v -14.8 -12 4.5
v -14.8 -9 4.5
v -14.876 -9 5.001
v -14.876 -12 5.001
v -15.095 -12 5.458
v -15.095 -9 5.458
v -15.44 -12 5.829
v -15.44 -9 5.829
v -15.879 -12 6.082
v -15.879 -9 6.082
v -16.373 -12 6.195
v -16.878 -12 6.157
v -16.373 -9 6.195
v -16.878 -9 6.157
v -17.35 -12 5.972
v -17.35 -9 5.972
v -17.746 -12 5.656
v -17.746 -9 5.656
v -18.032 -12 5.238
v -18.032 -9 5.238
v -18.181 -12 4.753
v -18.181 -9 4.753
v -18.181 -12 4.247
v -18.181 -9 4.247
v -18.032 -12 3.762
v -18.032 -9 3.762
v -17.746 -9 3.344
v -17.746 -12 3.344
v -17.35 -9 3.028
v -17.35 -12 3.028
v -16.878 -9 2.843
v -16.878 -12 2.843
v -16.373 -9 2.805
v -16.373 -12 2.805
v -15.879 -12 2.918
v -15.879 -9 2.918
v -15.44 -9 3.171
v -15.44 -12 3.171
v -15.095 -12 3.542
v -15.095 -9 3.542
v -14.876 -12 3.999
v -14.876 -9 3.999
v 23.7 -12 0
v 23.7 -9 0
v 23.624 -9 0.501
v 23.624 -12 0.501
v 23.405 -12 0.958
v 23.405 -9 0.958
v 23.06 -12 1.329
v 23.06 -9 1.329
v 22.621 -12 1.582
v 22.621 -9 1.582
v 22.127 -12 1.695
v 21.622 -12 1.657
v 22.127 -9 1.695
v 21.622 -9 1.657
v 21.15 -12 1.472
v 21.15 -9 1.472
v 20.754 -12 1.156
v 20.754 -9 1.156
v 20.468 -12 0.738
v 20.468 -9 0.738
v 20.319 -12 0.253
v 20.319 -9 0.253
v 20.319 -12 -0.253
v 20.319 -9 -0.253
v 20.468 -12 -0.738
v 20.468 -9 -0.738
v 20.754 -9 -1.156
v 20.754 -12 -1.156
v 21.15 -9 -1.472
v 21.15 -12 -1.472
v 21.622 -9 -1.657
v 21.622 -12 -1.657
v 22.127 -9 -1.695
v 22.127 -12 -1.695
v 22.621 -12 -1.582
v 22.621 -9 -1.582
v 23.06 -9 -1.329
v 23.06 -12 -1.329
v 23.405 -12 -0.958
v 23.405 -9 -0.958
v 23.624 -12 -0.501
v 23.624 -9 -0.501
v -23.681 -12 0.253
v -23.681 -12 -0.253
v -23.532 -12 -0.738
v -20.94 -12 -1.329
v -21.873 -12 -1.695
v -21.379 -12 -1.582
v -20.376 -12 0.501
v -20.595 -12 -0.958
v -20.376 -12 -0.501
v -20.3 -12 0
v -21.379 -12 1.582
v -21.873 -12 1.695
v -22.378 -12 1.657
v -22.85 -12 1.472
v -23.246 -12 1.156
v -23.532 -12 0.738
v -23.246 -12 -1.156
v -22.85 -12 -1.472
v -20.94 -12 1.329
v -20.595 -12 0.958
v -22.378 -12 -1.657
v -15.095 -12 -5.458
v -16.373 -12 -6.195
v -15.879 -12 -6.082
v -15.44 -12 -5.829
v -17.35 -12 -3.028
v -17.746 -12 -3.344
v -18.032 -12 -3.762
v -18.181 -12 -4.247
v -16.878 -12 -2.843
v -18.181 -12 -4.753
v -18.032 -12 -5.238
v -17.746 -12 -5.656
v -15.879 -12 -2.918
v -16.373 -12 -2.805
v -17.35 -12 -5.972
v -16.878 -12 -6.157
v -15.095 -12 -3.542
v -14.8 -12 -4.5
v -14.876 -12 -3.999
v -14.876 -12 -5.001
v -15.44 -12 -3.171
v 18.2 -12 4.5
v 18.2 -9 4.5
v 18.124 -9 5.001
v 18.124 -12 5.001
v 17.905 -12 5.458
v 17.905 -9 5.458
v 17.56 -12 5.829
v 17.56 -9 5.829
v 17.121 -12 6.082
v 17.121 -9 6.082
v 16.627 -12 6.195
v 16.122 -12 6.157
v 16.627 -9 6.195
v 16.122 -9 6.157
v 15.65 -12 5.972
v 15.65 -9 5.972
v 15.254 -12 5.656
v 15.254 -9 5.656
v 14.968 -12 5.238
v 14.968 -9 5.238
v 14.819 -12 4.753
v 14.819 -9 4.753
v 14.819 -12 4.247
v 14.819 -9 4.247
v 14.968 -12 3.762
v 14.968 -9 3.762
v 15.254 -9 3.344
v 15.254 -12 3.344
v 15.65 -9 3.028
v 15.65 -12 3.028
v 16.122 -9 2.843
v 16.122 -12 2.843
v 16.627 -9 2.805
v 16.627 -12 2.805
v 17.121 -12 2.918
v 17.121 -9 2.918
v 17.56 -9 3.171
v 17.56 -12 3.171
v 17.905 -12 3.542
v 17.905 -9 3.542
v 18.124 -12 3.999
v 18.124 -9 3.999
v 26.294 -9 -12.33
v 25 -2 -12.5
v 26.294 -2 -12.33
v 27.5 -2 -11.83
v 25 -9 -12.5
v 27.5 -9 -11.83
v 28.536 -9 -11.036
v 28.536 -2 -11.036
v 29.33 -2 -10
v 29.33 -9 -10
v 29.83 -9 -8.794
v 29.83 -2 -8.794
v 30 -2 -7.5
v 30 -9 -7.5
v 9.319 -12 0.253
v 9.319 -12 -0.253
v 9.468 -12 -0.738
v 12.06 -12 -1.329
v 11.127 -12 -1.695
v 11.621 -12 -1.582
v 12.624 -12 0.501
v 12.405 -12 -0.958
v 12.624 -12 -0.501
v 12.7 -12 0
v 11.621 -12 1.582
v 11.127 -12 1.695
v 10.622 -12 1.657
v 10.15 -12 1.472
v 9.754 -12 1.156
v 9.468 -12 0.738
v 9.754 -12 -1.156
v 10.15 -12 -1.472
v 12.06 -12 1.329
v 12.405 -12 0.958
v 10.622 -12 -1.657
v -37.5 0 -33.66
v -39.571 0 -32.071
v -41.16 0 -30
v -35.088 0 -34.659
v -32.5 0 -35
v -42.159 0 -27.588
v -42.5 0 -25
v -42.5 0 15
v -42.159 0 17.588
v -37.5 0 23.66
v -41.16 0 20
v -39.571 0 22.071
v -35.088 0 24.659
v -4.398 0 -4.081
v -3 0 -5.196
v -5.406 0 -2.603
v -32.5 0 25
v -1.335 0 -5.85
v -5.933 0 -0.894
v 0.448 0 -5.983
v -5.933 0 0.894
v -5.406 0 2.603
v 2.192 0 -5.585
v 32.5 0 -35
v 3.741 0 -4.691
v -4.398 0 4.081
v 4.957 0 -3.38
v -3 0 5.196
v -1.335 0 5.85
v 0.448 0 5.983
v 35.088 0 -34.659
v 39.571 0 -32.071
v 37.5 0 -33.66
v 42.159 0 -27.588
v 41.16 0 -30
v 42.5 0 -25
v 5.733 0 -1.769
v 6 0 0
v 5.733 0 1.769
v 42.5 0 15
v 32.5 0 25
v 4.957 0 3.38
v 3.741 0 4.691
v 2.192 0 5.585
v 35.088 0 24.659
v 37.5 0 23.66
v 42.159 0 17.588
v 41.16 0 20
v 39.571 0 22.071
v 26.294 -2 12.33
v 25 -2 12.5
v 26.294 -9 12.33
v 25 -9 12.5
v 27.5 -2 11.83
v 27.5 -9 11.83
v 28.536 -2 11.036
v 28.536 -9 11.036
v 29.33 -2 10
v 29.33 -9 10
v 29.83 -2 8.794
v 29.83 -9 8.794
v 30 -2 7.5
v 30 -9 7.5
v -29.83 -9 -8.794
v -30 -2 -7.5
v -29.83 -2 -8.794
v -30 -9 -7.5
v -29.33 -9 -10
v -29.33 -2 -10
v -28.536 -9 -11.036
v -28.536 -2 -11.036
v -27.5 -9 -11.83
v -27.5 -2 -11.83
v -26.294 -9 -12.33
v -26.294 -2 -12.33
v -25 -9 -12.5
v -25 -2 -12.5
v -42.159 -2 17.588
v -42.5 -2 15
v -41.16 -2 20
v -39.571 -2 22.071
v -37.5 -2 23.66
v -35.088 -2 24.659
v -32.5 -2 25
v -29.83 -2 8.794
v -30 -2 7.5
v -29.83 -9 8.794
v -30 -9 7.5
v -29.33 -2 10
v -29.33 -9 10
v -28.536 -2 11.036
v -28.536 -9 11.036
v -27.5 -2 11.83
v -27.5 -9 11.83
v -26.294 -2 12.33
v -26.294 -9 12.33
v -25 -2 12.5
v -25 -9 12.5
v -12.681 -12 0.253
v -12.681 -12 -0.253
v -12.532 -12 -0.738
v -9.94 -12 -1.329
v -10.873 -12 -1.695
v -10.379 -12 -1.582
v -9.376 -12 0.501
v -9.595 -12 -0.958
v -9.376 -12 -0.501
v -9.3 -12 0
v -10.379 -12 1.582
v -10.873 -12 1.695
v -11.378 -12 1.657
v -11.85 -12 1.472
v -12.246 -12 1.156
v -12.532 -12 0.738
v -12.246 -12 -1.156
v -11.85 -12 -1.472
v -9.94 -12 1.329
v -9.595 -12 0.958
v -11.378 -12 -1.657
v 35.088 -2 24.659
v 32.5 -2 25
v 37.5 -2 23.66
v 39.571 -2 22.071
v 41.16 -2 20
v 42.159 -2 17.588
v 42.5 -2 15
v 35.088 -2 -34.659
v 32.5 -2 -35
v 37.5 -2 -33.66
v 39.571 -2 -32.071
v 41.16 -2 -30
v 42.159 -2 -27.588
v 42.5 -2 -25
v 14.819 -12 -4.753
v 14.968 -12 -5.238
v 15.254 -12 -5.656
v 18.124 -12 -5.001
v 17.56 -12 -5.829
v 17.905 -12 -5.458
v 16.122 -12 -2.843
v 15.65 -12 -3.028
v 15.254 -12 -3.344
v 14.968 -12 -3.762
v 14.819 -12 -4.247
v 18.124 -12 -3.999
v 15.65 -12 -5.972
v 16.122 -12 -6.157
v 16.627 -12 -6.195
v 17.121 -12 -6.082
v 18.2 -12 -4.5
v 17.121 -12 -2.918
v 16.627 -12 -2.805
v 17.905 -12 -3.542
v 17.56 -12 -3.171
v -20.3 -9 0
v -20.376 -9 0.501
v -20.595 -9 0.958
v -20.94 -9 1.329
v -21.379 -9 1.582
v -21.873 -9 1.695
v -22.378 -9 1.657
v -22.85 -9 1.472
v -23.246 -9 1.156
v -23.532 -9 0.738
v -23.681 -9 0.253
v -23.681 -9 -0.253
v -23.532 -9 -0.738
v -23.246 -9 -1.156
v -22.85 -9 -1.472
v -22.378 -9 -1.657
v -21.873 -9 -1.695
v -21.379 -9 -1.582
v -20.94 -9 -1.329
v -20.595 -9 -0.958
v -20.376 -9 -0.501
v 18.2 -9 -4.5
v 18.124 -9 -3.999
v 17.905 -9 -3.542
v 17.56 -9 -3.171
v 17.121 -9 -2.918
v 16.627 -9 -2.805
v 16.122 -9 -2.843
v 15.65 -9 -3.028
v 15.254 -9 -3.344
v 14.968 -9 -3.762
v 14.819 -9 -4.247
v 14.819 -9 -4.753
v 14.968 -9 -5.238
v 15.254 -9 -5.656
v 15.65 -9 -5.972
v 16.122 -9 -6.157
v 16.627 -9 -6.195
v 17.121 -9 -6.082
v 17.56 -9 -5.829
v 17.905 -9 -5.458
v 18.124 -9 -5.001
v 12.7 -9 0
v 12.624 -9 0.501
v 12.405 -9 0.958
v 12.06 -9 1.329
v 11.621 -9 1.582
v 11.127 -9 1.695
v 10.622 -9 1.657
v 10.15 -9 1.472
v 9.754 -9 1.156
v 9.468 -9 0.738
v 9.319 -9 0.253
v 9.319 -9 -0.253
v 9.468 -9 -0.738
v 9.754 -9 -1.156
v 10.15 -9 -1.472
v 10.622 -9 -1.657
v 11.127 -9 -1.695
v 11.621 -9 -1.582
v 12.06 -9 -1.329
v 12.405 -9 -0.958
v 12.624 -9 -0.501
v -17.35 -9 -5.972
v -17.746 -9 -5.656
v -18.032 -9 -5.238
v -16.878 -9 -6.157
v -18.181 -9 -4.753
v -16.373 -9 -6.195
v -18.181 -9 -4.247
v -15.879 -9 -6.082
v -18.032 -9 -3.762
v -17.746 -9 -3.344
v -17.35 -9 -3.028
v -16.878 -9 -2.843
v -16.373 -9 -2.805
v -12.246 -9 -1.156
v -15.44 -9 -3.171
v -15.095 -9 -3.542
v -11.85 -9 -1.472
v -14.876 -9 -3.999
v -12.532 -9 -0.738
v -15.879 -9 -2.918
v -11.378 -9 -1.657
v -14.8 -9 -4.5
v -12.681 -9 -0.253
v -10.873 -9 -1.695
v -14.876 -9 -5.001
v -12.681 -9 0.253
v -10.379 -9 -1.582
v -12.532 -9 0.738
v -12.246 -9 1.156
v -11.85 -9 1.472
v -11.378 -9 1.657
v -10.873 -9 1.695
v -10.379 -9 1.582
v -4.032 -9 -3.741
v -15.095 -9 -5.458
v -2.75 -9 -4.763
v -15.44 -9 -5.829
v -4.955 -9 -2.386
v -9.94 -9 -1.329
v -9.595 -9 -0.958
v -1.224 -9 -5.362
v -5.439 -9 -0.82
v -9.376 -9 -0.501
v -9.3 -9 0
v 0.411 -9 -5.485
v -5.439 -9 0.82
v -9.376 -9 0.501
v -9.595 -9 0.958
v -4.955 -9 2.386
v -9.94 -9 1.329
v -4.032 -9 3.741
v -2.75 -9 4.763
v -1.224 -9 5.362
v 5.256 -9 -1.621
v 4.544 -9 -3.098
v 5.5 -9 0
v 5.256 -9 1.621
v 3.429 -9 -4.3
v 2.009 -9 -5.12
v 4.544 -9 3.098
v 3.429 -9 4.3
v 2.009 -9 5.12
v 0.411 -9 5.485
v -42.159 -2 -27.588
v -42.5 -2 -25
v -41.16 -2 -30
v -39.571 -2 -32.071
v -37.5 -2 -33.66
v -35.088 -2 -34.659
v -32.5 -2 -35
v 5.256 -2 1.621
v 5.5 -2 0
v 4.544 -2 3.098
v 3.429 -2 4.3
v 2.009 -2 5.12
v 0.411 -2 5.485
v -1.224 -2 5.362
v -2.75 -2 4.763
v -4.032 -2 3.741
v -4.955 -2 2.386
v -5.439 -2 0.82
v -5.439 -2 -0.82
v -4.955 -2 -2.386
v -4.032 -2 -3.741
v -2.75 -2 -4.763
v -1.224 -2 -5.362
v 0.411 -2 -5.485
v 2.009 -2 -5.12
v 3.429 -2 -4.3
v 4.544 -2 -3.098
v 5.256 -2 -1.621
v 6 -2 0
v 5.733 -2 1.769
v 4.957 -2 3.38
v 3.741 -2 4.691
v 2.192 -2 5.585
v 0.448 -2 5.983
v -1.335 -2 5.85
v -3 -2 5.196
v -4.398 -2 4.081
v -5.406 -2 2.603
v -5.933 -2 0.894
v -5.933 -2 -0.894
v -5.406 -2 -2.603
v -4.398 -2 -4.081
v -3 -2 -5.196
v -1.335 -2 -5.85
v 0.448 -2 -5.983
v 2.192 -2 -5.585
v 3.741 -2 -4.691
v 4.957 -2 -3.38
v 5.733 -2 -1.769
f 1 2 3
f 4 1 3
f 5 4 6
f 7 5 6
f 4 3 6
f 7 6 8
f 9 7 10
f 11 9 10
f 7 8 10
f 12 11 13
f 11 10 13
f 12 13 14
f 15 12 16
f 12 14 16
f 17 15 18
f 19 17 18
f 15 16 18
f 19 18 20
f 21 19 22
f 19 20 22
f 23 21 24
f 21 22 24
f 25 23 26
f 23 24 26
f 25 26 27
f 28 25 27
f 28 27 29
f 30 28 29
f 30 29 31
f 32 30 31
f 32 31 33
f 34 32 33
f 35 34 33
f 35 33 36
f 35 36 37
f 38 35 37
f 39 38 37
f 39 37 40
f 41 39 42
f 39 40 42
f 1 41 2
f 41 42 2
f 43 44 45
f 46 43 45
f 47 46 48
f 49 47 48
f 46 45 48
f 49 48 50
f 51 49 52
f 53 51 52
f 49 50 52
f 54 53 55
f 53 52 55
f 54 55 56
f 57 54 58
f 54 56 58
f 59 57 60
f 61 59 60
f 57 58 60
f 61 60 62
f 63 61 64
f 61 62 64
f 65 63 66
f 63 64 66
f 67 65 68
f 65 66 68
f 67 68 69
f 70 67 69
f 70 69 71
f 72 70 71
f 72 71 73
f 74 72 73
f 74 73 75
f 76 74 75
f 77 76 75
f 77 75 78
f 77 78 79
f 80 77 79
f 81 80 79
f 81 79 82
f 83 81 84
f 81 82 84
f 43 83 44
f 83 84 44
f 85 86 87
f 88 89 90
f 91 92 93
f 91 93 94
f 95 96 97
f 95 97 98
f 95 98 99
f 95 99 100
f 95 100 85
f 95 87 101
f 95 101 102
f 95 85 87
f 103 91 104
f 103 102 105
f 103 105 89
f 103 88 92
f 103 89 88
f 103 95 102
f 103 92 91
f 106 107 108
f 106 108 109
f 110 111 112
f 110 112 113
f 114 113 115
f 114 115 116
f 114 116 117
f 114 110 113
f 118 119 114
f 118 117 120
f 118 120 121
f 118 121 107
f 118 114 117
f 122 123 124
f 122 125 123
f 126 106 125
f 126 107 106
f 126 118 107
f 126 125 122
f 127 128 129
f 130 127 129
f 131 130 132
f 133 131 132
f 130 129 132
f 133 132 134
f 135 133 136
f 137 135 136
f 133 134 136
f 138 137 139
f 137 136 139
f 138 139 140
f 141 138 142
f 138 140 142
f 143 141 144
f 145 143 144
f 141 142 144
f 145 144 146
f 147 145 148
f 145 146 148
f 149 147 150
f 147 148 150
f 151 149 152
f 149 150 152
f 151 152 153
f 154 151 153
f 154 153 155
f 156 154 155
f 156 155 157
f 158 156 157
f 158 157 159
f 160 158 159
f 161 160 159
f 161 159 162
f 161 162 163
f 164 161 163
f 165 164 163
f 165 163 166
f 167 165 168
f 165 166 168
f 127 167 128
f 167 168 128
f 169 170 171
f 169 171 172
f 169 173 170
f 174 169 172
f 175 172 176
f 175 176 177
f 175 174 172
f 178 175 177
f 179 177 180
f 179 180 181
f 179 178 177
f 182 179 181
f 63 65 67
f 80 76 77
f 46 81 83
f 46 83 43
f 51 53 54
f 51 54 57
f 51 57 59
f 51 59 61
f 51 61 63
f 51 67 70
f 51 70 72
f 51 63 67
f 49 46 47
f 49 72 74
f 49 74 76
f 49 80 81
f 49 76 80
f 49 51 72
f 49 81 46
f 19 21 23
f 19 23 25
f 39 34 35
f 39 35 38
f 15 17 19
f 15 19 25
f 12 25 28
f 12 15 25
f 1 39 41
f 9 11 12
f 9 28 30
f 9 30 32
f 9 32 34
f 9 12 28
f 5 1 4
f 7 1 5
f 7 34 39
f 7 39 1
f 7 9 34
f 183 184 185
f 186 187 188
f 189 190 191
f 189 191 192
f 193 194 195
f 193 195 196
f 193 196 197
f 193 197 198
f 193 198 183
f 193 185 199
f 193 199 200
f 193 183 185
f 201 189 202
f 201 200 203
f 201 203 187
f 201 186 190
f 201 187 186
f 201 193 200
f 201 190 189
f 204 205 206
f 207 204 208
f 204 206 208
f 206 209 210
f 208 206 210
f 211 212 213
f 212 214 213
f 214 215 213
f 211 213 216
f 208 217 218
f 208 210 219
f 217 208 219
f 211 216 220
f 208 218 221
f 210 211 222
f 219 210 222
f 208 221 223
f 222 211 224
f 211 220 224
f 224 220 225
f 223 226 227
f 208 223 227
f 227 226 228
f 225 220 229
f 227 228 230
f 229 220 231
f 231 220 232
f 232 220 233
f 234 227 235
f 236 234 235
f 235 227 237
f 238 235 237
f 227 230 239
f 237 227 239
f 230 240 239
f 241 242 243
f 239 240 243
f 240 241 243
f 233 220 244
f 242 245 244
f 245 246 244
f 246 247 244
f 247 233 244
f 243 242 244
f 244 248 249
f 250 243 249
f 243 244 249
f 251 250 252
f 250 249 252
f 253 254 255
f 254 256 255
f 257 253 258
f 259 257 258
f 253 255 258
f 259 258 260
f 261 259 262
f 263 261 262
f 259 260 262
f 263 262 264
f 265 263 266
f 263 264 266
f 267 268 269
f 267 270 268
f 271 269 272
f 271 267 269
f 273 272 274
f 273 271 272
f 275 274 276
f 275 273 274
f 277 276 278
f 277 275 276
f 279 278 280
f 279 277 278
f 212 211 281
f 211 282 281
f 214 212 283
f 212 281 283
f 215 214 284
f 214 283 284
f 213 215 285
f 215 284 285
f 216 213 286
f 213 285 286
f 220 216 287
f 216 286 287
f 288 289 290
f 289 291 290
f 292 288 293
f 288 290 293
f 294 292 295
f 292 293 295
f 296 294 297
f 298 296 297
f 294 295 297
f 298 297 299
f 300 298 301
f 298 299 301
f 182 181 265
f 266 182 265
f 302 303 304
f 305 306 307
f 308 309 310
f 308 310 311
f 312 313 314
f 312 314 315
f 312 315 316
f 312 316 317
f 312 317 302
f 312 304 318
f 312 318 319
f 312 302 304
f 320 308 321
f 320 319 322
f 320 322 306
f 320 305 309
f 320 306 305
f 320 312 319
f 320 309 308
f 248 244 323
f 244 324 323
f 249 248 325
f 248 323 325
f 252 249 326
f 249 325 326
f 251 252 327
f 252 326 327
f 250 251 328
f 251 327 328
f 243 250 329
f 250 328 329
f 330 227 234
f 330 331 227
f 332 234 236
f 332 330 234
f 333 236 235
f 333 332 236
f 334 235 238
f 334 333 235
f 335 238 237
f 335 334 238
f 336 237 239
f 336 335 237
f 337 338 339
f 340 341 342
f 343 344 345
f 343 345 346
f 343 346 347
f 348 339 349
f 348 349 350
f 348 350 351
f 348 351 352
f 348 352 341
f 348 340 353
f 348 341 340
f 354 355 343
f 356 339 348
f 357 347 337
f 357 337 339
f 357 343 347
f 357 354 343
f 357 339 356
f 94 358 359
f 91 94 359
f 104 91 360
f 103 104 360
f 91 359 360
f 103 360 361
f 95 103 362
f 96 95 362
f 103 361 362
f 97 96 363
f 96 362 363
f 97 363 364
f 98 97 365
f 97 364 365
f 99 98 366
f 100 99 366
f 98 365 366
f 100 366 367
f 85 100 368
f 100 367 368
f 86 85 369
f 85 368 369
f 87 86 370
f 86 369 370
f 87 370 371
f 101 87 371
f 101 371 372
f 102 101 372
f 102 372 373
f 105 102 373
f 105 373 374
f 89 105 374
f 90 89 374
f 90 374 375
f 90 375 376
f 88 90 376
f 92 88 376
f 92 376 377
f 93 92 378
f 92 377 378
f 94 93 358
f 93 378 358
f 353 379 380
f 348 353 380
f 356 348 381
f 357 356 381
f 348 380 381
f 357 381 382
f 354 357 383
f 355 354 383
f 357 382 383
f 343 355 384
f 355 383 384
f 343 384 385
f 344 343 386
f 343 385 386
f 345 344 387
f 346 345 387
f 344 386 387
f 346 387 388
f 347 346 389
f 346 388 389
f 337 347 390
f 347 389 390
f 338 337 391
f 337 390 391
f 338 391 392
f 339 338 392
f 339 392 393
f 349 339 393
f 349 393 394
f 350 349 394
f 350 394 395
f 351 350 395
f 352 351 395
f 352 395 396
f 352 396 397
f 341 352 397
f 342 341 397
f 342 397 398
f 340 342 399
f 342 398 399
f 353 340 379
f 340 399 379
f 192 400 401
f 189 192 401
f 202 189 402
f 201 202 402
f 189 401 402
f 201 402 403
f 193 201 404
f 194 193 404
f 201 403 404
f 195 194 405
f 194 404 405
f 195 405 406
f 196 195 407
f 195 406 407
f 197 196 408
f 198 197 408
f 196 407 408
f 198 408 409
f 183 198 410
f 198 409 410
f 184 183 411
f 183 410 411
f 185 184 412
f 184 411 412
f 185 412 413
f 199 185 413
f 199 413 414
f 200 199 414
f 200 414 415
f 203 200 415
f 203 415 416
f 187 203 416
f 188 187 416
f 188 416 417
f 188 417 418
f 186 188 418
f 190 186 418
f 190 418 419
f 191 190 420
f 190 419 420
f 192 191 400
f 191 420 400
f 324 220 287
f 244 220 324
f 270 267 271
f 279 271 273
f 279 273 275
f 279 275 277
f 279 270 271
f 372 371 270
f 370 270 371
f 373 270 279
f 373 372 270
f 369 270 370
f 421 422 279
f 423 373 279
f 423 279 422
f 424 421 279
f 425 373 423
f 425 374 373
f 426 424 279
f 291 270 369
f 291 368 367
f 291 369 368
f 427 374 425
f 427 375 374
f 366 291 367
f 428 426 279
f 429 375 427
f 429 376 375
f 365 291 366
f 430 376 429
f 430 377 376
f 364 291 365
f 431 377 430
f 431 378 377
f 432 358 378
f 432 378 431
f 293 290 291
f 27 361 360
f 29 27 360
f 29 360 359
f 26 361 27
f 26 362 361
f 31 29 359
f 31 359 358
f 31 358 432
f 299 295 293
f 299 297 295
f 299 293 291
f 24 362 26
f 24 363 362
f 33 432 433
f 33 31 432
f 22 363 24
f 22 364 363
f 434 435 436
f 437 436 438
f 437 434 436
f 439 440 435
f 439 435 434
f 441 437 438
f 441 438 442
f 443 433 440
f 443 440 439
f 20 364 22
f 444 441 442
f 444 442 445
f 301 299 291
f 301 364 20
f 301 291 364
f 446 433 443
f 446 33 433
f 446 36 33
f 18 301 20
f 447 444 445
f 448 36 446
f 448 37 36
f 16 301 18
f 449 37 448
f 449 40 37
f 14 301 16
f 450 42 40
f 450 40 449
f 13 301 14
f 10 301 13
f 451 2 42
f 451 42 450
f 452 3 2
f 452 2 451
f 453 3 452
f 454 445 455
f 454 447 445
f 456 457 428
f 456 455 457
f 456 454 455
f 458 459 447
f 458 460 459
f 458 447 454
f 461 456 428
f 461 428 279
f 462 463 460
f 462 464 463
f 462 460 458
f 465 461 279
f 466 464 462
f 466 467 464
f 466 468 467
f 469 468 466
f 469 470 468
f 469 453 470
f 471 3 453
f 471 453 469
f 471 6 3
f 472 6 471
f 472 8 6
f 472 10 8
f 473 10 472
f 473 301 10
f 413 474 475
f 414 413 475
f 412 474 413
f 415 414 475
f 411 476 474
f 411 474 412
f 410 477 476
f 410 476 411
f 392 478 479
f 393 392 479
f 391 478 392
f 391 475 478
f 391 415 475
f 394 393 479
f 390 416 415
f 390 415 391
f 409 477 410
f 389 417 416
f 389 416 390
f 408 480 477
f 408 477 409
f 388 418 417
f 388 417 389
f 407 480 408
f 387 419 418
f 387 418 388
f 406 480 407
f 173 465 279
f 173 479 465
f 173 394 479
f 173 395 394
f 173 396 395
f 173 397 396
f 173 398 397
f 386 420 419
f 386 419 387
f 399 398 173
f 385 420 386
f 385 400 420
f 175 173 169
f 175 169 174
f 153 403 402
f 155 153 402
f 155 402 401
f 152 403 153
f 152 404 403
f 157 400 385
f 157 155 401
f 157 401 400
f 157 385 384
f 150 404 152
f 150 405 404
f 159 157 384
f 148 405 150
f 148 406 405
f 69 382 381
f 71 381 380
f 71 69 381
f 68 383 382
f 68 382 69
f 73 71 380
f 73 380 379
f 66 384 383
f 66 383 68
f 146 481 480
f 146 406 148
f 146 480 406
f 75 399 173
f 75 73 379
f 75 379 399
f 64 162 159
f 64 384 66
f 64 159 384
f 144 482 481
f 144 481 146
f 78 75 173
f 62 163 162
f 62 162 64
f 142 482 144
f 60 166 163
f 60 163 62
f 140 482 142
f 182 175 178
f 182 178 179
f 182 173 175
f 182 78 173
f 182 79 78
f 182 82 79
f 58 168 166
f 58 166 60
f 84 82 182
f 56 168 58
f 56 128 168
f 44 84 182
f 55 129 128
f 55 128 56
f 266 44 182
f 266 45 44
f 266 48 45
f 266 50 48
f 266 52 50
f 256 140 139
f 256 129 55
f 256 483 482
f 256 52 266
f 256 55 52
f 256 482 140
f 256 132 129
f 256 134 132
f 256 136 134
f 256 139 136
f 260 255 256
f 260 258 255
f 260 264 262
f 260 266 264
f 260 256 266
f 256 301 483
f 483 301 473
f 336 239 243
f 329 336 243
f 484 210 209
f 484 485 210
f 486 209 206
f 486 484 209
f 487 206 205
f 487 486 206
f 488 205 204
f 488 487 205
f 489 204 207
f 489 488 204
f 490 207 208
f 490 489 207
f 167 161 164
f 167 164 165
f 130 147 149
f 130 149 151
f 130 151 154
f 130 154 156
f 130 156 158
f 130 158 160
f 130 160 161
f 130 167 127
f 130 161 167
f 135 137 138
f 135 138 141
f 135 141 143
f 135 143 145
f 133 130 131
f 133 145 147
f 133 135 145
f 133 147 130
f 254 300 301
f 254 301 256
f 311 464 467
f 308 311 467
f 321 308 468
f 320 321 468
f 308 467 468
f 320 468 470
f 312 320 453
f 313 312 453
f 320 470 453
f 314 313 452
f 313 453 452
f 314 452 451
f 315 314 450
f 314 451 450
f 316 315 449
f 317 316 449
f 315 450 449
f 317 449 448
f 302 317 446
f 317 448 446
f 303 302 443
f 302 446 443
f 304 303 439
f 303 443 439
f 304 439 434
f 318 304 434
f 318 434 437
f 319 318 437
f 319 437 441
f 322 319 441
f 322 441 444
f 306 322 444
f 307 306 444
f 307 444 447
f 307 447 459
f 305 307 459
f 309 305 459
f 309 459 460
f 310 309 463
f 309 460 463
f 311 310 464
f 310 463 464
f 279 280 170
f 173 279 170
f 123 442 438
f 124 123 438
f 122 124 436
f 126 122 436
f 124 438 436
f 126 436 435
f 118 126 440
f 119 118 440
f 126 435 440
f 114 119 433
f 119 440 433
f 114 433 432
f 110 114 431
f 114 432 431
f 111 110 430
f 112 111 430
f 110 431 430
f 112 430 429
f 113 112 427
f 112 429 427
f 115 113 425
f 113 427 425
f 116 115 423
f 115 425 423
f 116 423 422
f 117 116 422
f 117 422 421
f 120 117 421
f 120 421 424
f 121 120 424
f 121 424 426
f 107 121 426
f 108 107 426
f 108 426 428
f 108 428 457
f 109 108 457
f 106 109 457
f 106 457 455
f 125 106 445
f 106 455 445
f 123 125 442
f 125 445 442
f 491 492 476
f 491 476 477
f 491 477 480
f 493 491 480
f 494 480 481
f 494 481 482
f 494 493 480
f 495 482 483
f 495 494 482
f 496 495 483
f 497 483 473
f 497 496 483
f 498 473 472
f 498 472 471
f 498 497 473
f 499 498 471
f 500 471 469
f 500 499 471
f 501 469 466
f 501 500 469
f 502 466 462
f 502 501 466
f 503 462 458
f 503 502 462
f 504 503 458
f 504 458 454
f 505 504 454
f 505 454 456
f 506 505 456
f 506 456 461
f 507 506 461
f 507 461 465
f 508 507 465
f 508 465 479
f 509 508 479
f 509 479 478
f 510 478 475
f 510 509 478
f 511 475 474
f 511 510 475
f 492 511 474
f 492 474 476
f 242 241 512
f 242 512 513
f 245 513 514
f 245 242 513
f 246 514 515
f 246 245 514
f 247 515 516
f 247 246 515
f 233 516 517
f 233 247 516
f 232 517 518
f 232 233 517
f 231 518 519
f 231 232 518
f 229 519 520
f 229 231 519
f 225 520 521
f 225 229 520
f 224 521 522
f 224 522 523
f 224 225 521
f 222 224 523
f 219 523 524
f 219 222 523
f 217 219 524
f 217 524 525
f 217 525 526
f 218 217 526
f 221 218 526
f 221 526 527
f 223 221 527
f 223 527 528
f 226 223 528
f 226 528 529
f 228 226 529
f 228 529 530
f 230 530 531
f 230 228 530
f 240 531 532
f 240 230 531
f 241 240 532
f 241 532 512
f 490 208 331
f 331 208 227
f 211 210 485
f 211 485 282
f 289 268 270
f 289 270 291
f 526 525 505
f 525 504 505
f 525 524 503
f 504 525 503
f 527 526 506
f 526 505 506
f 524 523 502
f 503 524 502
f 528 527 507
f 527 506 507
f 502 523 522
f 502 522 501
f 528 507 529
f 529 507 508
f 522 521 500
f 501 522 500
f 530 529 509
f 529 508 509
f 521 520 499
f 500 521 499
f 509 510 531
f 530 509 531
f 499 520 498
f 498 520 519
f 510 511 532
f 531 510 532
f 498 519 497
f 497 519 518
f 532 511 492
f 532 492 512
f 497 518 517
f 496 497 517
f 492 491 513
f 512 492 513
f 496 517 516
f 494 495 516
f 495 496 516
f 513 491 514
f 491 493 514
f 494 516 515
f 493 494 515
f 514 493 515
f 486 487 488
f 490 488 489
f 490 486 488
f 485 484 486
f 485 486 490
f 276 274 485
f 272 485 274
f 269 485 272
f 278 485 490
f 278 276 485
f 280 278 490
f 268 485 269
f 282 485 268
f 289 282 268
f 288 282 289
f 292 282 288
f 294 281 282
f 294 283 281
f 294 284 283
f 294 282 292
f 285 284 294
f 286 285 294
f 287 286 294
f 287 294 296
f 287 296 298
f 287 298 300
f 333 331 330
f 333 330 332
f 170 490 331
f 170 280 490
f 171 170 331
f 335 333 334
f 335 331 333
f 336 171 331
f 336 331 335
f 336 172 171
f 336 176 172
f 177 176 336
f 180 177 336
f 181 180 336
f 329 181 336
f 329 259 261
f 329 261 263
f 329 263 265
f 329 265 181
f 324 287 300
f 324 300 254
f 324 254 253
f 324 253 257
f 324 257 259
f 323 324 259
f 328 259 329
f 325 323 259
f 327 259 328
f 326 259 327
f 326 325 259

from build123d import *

# Parameters (mm, degrees)
F0_W     = 85
F0_H     = 60
F0_R     = 6
F1_DEPTH = 2
F2_W     = 60
F2_H     = 25
F2_R     = 5.5
F3_DEPTH = 7
F4_R     = 5
F5_R     = 10
F6_R     = 1.7
F7_DEPTH = 3


with BuildPart() as f1:
    # F0 (on Front) → F1 (new body)
    with BuildSketch(Plane.XZ):
        with Locations((0, -5)):
            Rectangle(F0_W, F0_H)
        Circle(F0_R, mode=Mode.SUBTRACT)
    extrude(amount=F1_DEPTH)

    # F2 (on face) → F3 (join)
    with BuildSketch(Plane.XZ.offset(2)):
        Rectangle(F2_W, F2_H)
        Circle(F2_R, mode=Mode.SUBTRACT)
    extrude(amount=F3_DEPTH)

    # F4
    f4_edges = [f1.edges().sort_by_distance(p)[0] for p in [
        (30, -5.5, 12.5),
        (30, -5.5, -12.5),
        (-30, -5.5, -12.5),
        (-30, -5.5, 12.5),
    ]]
    fillet(f4_edges, radius=F4_R)

    # F5
    f5_edges = [f1.edges().sort_by_distance(p)[0] for p in [
        (42.5, -1, 25),
        (42.5, -1, -35),
        (-42.5, -1, -35),
        (-42.5, -1, 25),
    ]]
    fillet(f5_edges, radius=F5_R)

    # F6 (on face) → F7 (join)
    with BuildSketch(Plane.XZ.offset(9)):
        with Locations((-11, 0)):
            Circle(F6_R)
        with Locations((-22, 0)):
            Circle(F6_R)
        with Locations((11, 0)):
            Circle(F6_R)
        with Locations((22, 0)):
            Circle(F6_R)
        with Locations((-16.5, -4.5)):
            Circle(F6_R)
        with Locations((16.5, -4.5)):
            Circle(F6_R)
        with Locations((16.5, 4.5)):
            Circle(F6_R)
        with Locations((-16.5, 4.5)):
            Circle(F6_R)
    extrude(amount=F7_DEPTH)


solid = f1.part
